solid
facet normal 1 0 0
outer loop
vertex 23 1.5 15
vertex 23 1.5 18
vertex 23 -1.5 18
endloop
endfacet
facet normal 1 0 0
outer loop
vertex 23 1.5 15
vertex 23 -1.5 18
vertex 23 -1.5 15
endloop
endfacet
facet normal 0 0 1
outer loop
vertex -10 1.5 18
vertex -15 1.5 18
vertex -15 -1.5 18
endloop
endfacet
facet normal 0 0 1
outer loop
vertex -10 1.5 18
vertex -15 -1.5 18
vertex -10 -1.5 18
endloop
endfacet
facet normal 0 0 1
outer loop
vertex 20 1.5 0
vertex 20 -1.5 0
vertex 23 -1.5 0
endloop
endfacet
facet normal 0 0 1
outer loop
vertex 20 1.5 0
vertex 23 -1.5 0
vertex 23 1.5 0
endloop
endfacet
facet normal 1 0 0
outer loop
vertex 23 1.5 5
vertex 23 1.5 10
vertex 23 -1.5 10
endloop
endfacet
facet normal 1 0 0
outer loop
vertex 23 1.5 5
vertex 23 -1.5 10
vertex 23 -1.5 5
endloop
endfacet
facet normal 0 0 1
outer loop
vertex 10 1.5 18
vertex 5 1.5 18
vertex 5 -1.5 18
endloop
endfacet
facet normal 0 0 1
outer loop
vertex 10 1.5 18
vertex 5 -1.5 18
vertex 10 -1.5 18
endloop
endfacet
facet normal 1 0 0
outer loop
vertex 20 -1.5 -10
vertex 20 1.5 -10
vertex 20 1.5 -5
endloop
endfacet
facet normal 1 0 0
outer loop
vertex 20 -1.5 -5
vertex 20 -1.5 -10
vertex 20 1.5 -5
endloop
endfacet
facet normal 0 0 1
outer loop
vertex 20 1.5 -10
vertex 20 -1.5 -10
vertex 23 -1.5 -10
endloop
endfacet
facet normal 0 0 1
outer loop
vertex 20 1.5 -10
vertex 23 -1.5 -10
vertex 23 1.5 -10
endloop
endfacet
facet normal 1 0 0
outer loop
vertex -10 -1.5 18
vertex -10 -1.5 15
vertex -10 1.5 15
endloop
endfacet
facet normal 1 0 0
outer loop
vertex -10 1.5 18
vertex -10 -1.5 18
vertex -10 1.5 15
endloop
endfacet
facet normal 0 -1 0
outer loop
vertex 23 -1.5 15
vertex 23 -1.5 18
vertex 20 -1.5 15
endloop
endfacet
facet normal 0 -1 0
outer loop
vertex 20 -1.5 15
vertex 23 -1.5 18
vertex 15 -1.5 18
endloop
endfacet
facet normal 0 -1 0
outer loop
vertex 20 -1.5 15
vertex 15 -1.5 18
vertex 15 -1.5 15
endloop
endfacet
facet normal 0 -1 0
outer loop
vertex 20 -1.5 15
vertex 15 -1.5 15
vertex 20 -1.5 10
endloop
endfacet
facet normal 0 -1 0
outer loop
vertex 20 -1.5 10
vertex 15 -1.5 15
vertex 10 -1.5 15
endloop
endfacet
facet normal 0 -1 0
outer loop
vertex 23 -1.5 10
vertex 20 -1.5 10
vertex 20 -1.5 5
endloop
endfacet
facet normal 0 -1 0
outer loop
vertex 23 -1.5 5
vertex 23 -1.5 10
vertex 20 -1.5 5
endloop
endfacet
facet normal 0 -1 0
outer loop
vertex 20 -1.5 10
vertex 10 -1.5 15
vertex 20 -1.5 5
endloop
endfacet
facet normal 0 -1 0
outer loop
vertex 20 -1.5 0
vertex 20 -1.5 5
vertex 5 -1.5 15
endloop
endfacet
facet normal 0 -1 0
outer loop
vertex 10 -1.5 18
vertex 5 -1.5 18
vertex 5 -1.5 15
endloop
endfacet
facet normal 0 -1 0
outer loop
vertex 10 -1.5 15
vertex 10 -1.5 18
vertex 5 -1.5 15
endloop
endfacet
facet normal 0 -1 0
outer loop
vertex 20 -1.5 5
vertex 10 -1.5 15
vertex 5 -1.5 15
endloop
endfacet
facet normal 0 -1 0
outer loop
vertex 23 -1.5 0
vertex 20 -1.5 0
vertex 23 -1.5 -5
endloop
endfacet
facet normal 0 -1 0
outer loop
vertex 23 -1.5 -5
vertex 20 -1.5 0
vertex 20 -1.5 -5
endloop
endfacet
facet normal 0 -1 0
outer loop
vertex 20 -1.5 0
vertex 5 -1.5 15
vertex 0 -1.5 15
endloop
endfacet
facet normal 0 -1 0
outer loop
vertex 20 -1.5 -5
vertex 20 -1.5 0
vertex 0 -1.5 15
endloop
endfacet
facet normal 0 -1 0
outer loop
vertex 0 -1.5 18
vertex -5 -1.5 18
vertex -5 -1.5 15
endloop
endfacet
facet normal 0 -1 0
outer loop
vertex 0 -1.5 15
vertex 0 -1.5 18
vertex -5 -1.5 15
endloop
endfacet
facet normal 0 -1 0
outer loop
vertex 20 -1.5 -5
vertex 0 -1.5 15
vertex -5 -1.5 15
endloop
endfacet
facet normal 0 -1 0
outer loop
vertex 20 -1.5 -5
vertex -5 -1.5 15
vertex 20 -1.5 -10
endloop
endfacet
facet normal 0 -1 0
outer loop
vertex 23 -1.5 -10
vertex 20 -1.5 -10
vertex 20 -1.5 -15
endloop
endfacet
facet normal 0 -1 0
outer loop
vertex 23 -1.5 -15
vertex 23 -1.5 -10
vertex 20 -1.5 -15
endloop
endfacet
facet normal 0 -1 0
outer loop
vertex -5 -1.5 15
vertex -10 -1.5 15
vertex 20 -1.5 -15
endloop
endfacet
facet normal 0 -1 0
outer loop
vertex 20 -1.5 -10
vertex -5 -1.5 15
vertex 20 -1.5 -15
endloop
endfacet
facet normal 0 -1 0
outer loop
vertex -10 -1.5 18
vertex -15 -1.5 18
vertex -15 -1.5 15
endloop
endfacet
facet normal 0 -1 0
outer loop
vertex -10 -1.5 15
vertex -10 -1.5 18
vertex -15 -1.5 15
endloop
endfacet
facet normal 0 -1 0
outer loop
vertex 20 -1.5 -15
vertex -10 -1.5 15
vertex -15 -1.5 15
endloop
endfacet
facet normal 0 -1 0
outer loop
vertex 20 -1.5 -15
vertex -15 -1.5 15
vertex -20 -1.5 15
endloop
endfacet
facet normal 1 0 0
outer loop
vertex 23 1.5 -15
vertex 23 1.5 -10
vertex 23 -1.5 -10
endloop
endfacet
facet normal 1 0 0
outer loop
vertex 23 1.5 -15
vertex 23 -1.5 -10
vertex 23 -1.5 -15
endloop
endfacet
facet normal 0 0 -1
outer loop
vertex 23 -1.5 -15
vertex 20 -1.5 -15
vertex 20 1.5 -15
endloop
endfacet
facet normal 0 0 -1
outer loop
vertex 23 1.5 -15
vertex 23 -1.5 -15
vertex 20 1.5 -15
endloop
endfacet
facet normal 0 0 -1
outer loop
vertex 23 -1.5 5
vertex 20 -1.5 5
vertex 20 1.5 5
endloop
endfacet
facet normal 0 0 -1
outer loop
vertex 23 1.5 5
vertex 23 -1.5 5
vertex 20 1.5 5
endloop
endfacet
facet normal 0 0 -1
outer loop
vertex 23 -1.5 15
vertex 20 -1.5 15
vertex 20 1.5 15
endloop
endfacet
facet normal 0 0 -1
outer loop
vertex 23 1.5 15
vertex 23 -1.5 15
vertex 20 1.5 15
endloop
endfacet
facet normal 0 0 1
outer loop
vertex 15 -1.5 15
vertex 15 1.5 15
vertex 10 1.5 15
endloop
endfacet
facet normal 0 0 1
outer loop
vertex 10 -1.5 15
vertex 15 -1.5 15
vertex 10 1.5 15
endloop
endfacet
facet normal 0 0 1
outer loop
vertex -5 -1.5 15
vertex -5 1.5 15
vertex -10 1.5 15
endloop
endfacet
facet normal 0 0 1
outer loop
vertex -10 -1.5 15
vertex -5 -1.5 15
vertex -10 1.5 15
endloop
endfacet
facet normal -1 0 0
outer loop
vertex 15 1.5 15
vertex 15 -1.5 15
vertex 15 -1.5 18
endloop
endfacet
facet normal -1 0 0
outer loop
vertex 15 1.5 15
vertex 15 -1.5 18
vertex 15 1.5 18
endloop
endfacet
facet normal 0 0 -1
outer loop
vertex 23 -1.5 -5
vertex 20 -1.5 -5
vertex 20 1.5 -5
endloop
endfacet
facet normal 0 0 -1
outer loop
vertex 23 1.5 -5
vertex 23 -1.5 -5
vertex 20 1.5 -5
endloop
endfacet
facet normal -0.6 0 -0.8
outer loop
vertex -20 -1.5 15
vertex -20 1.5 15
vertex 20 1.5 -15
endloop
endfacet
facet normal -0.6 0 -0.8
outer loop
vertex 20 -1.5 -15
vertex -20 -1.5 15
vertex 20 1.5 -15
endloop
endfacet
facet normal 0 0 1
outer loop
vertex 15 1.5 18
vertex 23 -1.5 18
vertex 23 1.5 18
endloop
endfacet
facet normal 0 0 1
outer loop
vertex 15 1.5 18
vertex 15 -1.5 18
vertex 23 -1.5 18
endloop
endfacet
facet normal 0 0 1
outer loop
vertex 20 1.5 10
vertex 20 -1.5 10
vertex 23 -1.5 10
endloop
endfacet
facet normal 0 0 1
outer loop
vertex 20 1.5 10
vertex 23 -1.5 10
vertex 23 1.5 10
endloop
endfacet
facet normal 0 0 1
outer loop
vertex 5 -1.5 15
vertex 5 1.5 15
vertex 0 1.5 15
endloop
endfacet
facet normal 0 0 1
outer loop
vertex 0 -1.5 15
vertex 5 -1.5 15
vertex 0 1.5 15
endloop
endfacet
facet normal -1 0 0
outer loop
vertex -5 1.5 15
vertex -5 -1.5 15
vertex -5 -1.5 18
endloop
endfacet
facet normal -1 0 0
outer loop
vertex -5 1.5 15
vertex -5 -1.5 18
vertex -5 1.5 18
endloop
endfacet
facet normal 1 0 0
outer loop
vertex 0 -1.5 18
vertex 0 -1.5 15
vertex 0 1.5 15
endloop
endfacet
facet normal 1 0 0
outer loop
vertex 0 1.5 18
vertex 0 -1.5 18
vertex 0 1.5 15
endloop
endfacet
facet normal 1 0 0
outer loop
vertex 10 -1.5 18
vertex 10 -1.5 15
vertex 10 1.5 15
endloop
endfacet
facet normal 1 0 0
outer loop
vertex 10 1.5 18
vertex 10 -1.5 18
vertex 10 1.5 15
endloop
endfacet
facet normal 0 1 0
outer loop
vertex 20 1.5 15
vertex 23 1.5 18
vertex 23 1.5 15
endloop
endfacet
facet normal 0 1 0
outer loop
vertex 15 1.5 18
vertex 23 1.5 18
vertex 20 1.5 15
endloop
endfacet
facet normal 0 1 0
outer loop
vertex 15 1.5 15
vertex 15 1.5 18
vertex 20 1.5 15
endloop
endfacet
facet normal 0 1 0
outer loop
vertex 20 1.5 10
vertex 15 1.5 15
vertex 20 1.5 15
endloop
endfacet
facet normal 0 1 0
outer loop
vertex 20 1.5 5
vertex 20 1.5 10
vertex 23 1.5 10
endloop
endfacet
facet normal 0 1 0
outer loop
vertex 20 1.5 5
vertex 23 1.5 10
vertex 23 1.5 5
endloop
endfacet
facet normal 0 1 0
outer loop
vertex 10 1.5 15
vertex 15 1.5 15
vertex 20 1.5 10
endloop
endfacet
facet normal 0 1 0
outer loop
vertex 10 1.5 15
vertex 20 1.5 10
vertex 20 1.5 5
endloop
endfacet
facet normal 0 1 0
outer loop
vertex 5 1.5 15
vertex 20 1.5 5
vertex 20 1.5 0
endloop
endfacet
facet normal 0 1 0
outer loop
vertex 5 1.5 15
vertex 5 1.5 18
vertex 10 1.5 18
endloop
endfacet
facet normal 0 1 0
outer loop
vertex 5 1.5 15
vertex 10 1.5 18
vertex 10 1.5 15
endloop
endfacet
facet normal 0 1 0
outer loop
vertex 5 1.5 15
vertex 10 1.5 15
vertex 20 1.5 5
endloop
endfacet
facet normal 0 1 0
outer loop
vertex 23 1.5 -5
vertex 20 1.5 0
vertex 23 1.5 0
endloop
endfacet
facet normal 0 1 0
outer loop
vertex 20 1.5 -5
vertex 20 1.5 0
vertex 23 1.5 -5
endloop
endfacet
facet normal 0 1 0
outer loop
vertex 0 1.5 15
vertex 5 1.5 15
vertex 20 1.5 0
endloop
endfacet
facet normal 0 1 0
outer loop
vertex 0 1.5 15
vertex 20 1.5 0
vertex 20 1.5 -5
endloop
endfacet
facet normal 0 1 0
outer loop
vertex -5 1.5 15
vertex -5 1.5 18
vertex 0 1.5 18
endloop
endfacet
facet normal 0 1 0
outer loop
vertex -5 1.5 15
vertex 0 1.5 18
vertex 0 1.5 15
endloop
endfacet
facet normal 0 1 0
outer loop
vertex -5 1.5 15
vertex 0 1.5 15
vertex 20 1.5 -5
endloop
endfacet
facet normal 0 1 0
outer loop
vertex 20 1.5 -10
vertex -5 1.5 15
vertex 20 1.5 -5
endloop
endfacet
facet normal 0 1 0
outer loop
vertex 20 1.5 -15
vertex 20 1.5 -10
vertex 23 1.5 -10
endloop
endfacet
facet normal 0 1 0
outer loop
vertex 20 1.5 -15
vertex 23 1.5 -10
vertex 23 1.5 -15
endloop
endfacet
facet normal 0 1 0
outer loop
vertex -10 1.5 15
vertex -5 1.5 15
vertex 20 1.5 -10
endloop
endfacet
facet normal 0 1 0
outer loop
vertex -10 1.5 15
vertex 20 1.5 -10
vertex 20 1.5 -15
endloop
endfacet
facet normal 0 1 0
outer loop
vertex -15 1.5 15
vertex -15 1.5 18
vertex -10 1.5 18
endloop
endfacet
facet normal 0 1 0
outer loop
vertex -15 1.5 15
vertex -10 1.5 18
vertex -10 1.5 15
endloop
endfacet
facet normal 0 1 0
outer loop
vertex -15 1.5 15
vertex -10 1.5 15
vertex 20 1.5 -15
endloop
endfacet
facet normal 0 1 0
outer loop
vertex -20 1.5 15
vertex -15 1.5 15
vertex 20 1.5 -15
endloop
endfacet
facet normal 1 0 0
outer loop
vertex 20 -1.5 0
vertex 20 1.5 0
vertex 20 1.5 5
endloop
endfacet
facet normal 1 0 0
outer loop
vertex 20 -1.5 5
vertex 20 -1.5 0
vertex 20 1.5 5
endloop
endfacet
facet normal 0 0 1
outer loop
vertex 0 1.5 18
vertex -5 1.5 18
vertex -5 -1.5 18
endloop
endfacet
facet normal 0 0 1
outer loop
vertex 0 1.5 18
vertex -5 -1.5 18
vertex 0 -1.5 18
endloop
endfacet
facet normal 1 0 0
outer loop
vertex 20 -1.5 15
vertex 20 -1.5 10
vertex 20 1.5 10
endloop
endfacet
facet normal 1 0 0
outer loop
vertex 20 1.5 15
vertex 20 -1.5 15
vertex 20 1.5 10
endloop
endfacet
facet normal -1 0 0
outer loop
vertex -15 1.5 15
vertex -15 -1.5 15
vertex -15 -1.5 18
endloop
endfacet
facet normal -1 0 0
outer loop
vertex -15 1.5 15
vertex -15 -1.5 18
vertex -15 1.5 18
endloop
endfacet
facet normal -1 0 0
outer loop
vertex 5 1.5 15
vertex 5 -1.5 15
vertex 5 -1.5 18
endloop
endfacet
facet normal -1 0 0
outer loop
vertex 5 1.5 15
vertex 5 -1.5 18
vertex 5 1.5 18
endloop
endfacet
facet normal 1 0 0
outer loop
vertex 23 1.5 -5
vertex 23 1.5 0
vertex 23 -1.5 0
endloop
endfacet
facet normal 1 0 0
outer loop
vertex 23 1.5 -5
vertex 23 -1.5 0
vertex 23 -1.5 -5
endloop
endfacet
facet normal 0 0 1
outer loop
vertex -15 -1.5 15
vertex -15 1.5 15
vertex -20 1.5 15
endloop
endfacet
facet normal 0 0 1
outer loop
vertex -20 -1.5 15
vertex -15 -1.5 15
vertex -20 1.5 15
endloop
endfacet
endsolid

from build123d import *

# Parameters (mm, degrees)
BOSS_EXTRUDE1_DEPTH = 1.5
SKETCH2_W           = 5
SKETCH2_H           = 3
BOSS_EXTRUDE2_DEPTH = 3
SKETCH3_W           = 5
SKETCH3_H           = 3
BOSS_EXTRUDE3_DEPTH = 3
SKETCH4_W           = 3
SKETCH4_H           = 3
BOSS_EXTRUDE4_DEPTH = 3


with BuildPart() as part:
    # Sketch1 → Boss-Extrude1 (new body, symmetric)
    with BuildSketch(Plane(origin=(0, 0, 0), x_dir=(1, 0, 0), z_dir=(0, 1, 0))):
        Polygon((20, 15), (20, -15), (-20, -15), align=None)
    extrude(amount=BOSS_EXTRUDE1_DEPTH, both=True)

    # Sketch2 → Boss-Extrude2 (add)
    with BuildSketch(Plane(origin=(20, 0, 0), x_dir=(0, 0, -1), z_dir=(1, 0, 0))):
        with Locations((12.5, 0)):
            Rectangle(SKETCH2_W, SKETCH2_H)
        with Locations((2.5, 0)):
            Rectangle(SKETCH2_W, SKETCH2_H)
        with Locations((-7.5, 0)):
            Rectangle(SKETCH2_W, SKETCH2_H)
    extrude(amount=BOSS_EXTRUDE2_DEPTH)

    # Sketch3 → Boss-Extrude3 (add)
    with BuildSketch(Plane.XY.offset(15)):
        with Locations((17.5, 0)):
            Rectangle(SKETCH3_W, SKETCH3_H)
        with Locations((7.5, 0)):
            Rectangle(SKETCH3_W, SKETCH3_H)
        with Locations((-2.5, 0)):
            Rectangle(SKETCH3_W, SKETCH3_H)
        with Locations((-12.5, 0)):
            Rectangle(SKETCH3_W, SKETCH3_H)
    extrude(amount=BOSS_EXTRUDE3_DEPTH)

    # Sketch4 → Boss-Extrude4 (add)
    with BuildSketch(Plane(origin=(20, 0, 0), x_dir=(0, 0, -1), z_dir=(1, 0, 0))):
        with Locations((-16.5, 0)):
            Rectangle(SKETCH4_W, SKETCH4_H)
    extrude(amount=BOSS_EXTRUDE4_DEPTH)


solid = part.part
